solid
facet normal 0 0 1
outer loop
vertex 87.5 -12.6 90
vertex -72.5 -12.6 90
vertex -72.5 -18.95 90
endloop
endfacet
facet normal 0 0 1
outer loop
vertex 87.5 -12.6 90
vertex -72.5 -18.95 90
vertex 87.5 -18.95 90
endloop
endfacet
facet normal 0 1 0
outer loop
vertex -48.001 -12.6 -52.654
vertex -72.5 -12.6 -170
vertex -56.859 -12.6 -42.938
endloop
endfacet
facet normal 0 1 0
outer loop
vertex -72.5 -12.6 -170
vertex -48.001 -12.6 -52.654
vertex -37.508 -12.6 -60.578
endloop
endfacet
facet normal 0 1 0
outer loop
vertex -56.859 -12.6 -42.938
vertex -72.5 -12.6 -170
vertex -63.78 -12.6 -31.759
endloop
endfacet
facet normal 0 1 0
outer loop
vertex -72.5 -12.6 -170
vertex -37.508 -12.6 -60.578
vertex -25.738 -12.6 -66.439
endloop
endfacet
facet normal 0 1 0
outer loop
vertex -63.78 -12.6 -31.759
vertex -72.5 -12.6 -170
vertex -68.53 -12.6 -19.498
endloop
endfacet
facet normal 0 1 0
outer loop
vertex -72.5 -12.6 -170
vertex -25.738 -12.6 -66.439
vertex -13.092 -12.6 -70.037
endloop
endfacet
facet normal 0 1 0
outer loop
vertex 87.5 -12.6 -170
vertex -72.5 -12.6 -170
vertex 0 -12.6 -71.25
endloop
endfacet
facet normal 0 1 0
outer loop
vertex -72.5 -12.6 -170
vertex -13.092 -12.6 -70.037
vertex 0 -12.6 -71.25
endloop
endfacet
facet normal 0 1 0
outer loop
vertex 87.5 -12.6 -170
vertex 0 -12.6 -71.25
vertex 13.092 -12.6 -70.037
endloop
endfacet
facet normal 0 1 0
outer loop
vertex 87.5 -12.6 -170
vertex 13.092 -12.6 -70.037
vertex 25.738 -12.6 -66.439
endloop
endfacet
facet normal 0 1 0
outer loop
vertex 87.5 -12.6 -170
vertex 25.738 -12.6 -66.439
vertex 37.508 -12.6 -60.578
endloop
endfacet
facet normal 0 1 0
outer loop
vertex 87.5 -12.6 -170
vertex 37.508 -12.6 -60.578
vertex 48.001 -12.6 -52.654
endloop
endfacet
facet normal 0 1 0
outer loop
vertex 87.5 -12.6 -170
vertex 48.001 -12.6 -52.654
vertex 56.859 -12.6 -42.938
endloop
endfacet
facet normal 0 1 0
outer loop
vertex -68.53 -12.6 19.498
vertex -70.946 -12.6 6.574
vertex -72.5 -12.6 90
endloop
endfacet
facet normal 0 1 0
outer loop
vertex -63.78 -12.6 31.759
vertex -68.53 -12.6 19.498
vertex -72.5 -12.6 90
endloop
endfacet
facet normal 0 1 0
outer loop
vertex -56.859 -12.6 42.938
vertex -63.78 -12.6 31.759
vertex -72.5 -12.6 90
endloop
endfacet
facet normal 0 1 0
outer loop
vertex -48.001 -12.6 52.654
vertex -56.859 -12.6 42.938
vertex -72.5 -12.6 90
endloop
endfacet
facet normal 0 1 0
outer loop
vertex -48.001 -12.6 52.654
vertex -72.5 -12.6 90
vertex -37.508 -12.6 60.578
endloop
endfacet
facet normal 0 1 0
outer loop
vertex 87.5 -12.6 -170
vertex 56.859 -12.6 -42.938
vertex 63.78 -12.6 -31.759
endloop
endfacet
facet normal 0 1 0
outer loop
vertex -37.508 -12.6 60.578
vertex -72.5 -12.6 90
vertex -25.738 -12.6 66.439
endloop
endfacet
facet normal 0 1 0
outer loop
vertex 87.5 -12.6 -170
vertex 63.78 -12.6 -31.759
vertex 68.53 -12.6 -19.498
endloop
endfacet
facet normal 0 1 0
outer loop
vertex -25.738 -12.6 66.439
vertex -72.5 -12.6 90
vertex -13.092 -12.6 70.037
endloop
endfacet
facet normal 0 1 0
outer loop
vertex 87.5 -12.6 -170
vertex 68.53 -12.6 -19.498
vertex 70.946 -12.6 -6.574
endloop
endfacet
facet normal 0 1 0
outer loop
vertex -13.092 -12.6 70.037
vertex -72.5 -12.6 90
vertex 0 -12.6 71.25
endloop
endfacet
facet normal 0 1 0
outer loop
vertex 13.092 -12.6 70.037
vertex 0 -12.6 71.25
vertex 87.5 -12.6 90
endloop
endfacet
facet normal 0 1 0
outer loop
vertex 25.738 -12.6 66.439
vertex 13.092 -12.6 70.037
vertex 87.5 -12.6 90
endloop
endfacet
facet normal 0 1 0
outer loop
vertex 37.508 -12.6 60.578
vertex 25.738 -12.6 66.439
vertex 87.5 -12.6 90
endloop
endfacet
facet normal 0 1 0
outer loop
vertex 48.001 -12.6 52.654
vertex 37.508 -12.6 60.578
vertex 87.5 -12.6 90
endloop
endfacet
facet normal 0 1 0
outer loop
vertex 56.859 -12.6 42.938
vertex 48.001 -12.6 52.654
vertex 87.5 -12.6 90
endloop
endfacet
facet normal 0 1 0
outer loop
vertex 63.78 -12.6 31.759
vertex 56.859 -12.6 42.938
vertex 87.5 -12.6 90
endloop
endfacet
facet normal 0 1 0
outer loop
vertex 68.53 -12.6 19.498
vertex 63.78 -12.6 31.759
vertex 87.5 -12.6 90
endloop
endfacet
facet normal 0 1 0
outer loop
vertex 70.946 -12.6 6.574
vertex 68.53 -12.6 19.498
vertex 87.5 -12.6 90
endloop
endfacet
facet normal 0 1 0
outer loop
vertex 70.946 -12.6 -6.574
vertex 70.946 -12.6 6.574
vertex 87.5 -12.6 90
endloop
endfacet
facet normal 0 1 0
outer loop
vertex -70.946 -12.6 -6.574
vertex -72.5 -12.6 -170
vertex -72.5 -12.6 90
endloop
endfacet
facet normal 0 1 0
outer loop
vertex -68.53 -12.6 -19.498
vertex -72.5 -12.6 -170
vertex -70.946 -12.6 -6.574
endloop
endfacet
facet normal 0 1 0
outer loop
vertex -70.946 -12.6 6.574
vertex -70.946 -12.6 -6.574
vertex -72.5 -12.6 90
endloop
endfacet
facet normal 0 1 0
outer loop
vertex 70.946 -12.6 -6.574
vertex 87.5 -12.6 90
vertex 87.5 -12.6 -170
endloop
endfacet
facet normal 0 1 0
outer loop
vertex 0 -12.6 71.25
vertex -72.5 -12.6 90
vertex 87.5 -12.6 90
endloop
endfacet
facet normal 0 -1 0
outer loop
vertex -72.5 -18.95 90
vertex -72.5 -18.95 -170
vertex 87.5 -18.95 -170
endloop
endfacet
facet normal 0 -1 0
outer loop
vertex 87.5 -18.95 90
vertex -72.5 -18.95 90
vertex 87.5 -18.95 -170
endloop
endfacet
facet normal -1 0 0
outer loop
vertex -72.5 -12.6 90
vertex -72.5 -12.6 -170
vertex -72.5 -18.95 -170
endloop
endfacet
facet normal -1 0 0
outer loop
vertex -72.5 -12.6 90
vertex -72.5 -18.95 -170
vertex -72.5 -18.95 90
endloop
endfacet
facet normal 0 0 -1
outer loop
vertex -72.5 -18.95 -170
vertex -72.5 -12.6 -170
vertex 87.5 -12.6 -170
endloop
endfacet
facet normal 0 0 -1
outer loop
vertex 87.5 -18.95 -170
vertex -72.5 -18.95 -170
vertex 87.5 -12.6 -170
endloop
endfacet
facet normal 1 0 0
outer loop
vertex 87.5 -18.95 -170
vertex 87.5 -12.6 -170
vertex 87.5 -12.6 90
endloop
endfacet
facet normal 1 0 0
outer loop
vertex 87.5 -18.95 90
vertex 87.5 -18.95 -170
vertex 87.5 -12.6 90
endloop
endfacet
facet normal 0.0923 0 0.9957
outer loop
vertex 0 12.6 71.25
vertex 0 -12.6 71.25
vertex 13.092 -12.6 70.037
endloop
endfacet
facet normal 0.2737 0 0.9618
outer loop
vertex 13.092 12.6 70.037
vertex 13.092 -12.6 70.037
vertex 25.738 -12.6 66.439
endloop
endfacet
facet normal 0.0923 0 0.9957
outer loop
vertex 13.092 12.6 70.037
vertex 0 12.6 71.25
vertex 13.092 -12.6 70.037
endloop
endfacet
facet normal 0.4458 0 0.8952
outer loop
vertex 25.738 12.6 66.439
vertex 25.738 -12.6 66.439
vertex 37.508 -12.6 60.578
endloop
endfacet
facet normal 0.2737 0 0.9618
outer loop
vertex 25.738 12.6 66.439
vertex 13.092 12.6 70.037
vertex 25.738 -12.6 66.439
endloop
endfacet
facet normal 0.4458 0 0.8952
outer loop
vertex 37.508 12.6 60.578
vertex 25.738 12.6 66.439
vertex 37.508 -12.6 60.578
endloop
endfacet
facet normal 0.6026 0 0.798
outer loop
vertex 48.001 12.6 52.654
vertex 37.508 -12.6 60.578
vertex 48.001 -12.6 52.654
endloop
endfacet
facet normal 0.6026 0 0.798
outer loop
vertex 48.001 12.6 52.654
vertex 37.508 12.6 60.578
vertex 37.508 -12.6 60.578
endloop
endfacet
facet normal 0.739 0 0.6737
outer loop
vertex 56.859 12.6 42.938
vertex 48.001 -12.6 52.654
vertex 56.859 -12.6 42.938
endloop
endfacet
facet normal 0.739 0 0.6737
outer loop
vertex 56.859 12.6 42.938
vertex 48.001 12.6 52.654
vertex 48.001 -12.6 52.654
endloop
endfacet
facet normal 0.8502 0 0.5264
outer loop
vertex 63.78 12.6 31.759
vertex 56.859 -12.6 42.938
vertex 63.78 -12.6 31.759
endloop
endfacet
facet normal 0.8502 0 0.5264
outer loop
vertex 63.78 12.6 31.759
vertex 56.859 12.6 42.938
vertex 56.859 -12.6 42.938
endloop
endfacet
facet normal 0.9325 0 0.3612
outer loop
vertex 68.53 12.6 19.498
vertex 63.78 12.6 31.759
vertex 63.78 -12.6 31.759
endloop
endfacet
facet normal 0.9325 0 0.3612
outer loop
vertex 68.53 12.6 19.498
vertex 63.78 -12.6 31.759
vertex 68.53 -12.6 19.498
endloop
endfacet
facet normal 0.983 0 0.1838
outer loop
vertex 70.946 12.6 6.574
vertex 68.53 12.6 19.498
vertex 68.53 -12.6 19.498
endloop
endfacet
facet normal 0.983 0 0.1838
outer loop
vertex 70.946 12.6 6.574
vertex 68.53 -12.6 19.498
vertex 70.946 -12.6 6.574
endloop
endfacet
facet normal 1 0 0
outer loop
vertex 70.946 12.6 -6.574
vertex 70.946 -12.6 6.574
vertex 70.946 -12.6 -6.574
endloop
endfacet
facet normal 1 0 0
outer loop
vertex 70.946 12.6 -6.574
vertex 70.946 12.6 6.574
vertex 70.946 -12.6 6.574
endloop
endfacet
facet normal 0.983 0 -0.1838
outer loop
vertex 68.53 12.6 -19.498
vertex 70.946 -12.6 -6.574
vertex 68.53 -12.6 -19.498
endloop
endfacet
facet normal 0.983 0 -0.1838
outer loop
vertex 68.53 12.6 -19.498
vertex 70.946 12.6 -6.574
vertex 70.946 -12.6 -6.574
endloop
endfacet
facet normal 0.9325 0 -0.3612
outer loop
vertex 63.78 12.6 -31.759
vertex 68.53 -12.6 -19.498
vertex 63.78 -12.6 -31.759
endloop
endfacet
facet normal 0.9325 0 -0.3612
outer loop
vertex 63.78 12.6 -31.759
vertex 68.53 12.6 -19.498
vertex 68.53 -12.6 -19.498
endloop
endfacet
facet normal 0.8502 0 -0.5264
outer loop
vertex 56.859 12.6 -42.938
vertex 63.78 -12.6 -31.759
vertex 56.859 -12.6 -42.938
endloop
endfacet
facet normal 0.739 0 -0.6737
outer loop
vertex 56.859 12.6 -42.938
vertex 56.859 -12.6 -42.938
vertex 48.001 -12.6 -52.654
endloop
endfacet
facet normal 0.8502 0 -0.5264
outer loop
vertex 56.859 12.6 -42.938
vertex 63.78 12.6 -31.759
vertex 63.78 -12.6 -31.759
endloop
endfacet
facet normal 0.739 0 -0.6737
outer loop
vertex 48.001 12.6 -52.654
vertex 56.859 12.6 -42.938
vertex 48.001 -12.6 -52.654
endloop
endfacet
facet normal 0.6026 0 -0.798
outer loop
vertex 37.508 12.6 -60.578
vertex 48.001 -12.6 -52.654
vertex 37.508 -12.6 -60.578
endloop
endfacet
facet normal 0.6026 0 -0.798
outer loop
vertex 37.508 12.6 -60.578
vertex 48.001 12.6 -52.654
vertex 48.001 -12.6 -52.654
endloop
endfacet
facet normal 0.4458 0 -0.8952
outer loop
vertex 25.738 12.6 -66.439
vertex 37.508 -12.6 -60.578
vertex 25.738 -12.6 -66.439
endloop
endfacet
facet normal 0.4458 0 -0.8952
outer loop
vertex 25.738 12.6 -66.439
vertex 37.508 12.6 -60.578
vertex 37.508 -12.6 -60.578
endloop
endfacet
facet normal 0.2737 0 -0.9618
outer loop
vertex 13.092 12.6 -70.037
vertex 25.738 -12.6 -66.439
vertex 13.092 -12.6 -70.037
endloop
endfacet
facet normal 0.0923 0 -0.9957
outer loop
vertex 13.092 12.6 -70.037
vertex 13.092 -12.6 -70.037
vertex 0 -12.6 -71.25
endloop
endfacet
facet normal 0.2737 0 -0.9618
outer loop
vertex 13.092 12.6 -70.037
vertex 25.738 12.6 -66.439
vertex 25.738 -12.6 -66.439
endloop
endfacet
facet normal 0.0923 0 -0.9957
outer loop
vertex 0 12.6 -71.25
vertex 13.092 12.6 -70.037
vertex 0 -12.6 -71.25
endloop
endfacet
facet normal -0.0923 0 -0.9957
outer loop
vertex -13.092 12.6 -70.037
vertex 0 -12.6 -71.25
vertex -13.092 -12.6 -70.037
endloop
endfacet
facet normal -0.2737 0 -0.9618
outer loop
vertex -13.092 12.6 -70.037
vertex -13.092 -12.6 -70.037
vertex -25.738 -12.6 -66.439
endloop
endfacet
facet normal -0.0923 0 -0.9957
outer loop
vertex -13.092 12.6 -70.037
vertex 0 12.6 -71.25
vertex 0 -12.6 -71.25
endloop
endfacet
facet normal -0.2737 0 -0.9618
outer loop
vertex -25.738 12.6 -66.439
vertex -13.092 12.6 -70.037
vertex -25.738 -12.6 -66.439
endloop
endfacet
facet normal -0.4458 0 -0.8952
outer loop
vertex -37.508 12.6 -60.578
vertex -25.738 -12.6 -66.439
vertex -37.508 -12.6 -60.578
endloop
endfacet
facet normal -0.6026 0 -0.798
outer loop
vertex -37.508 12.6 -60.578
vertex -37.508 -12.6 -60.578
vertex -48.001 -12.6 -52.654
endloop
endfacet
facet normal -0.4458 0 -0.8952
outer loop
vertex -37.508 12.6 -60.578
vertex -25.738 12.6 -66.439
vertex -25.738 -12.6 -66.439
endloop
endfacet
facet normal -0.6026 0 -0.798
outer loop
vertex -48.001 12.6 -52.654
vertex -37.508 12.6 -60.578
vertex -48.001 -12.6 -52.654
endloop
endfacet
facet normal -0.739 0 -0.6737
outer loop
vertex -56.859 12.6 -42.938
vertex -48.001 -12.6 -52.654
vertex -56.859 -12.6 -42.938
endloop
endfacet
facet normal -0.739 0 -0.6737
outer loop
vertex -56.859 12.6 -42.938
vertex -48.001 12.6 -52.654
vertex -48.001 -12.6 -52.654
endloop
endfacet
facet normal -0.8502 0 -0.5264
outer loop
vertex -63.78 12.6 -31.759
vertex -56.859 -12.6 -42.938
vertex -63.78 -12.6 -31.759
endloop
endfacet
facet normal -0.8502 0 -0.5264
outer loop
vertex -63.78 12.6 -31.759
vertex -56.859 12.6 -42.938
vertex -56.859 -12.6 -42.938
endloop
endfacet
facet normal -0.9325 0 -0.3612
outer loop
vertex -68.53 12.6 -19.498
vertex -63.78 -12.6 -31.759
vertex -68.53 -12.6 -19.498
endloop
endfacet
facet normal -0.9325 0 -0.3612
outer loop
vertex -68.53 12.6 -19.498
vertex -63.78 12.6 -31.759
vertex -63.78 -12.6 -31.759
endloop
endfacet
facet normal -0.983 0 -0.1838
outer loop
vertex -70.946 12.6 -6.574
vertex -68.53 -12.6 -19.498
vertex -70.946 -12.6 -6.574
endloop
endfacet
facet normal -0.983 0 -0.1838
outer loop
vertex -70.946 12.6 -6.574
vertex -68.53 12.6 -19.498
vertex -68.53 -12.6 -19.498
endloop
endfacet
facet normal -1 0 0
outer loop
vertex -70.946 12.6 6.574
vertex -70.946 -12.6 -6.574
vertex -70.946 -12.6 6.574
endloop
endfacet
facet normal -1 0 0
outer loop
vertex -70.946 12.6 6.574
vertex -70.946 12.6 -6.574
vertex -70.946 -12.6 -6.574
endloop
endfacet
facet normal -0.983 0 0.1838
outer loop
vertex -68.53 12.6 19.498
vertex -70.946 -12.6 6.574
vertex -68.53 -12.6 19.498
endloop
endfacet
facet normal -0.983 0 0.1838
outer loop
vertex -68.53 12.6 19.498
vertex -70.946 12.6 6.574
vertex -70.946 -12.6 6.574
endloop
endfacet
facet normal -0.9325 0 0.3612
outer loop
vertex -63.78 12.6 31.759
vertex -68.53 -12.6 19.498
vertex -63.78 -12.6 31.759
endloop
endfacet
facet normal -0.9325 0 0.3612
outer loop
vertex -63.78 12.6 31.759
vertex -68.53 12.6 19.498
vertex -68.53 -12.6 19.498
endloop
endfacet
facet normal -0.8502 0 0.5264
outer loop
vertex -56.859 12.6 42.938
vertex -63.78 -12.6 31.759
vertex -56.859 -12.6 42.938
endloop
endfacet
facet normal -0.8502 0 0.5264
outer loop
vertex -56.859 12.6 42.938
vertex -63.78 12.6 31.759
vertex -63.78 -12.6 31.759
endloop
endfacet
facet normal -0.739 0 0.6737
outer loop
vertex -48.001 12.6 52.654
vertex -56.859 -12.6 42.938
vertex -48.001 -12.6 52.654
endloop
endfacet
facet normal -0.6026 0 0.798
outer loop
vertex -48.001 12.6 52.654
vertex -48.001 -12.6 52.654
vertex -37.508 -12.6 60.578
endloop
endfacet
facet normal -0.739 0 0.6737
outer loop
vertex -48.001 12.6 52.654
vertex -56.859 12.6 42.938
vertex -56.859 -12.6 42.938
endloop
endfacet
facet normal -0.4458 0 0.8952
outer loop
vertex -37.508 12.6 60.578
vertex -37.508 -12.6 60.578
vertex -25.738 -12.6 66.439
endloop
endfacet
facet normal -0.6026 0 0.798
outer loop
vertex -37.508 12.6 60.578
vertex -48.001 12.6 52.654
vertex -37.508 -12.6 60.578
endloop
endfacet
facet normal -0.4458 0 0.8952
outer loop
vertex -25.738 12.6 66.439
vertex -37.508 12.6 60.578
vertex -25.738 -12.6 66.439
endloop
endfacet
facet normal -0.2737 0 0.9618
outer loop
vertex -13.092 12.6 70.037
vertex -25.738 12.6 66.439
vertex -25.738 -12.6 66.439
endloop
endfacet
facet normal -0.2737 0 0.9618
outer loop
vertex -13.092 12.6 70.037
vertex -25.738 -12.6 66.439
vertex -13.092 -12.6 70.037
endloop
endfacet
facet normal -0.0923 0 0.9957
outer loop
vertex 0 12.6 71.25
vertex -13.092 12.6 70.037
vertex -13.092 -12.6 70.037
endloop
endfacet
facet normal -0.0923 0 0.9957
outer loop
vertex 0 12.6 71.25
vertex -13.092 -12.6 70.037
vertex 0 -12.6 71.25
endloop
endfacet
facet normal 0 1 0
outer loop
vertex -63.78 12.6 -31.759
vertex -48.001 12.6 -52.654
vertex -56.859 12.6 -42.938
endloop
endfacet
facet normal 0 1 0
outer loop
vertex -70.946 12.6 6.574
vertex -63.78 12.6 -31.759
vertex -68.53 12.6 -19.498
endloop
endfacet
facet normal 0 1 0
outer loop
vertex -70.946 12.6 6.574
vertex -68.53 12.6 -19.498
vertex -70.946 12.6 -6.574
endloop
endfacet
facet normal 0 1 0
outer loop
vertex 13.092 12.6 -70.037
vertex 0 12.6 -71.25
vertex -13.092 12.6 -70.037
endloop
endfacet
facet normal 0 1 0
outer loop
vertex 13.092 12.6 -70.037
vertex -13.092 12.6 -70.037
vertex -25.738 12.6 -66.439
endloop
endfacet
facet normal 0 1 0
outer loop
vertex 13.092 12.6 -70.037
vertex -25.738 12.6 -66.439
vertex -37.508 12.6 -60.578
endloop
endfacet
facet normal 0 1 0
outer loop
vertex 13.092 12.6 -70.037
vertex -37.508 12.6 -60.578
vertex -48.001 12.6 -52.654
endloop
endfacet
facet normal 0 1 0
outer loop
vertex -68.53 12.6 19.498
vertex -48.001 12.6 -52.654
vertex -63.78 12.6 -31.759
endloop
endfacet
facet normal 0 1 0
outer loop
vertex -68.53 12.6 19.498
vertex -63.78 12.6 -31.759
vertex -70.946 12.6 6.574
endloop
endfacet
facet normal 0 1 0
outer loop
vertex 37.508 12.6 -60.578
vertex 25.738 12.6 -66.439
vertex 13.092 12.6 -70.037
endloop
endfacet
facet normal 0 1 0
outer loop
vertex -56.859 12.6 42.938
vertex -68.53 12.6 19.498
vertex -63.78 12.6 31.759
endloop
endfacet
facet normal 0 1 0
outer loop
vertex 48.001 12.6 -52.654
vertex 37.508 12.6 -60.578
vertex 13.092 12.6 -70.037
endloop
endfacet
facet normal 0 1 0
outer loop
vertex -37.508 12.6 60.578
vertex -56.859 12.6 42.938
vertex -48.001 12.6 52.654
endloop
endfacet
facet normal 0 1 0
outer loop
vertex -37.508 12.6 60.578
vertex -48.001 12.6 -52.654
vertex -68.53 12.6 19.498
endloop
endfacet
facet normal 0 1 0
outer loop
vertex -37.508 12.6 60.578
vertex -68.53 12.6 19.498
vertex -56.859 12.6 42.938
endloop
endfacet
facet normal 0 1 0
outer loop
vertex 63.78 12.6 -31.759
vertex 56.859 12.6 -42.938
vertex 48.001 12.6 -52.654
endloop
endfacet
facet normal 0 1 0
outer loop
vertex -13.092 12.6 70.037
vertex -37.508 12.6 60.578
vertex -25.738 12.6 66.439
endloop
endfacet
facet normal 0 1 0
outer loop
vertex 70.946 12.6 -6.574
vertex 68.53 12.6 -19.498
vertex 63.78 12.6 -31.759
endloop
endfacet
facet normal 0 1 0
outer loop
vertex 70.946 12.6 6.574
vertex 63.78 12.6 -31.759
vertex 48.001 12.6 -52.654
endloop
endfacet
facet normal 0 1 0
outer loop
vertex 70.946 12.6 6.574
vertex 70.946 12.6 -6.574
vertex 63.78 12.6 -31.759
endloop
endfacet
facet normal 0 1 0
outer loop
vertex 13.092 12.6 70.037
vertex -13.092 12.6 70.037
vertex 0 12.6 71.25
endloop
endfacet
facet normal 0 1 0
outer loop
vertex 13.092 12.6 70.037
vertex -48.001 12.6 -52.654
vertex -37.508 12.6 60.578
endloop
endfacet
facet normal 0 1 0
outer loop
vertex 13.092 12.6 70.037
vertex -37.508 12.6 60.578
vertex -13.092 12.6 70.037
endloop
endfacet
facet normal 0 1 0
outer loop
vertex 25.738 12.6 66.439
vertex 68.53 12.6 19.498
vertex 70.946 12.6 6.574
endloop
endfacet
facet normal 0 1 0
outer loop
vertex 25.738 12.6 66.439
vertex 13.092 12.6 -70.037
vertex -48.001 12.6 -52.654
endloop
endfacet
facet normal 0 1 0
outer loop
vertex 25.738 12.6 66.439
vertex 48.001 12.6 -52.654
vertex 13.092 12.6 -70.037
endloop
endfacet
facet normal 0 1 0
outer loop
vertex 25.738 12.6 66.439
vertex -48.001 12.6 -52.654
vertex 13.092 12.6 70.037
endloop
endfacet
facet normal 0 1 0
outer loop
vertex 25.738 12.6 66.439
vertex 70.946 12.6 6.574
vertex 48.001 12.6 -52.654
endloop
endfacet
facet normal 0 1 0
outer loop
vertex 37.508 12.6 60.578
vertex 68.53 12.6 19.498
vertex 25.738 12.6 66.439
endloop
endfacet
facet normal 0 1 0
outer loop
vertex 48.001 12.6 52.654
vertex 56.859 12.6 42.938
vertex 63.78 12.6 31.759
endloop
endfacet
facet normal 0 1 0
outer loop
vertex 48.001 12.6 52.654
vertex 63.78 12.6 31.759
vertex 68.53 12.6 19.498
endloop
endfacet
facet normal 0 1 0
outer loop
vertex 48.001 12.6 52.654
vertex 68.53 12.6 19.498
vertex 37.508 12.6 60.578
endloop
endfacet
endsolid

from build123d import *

# Parameters (mm, degrees)
SKETCH1_R           = 71.25
BOSS_EXTRUDE1_DEPTH = 12.6
SKETCH2_W           = 160
SKETCH2_H           = 260
BOSS_EXTRUDE2_DEPTH = 6.35


with BuildPart() as part:
    # Sketch1 → Boss-Extrude1 (new, symmetric)
    with BuildSketch(Plane(origin=(0, 0, 0), x_dir=(1, 0, 0), z_dir=(0, 1, 0))):
        with Locations(Location((0, 0, 0), (0, 0, 270))):
            Circle(SKETCH1_R)
    extrude(amount=BOSS_EXTRUDE1_DEPTH, both=True)

    # Sketch2 → Boss-Extrude2 (add)
    with BuildSketch(Plane.XZ.offset(12.6)):
        with Locations((7.5, -40)):
            Rectangle(SKETCH2_W, SKETCH2_H)
    extrude(amount=BOSS_EXTRUDE2_DEPTH)


solid = part.part
